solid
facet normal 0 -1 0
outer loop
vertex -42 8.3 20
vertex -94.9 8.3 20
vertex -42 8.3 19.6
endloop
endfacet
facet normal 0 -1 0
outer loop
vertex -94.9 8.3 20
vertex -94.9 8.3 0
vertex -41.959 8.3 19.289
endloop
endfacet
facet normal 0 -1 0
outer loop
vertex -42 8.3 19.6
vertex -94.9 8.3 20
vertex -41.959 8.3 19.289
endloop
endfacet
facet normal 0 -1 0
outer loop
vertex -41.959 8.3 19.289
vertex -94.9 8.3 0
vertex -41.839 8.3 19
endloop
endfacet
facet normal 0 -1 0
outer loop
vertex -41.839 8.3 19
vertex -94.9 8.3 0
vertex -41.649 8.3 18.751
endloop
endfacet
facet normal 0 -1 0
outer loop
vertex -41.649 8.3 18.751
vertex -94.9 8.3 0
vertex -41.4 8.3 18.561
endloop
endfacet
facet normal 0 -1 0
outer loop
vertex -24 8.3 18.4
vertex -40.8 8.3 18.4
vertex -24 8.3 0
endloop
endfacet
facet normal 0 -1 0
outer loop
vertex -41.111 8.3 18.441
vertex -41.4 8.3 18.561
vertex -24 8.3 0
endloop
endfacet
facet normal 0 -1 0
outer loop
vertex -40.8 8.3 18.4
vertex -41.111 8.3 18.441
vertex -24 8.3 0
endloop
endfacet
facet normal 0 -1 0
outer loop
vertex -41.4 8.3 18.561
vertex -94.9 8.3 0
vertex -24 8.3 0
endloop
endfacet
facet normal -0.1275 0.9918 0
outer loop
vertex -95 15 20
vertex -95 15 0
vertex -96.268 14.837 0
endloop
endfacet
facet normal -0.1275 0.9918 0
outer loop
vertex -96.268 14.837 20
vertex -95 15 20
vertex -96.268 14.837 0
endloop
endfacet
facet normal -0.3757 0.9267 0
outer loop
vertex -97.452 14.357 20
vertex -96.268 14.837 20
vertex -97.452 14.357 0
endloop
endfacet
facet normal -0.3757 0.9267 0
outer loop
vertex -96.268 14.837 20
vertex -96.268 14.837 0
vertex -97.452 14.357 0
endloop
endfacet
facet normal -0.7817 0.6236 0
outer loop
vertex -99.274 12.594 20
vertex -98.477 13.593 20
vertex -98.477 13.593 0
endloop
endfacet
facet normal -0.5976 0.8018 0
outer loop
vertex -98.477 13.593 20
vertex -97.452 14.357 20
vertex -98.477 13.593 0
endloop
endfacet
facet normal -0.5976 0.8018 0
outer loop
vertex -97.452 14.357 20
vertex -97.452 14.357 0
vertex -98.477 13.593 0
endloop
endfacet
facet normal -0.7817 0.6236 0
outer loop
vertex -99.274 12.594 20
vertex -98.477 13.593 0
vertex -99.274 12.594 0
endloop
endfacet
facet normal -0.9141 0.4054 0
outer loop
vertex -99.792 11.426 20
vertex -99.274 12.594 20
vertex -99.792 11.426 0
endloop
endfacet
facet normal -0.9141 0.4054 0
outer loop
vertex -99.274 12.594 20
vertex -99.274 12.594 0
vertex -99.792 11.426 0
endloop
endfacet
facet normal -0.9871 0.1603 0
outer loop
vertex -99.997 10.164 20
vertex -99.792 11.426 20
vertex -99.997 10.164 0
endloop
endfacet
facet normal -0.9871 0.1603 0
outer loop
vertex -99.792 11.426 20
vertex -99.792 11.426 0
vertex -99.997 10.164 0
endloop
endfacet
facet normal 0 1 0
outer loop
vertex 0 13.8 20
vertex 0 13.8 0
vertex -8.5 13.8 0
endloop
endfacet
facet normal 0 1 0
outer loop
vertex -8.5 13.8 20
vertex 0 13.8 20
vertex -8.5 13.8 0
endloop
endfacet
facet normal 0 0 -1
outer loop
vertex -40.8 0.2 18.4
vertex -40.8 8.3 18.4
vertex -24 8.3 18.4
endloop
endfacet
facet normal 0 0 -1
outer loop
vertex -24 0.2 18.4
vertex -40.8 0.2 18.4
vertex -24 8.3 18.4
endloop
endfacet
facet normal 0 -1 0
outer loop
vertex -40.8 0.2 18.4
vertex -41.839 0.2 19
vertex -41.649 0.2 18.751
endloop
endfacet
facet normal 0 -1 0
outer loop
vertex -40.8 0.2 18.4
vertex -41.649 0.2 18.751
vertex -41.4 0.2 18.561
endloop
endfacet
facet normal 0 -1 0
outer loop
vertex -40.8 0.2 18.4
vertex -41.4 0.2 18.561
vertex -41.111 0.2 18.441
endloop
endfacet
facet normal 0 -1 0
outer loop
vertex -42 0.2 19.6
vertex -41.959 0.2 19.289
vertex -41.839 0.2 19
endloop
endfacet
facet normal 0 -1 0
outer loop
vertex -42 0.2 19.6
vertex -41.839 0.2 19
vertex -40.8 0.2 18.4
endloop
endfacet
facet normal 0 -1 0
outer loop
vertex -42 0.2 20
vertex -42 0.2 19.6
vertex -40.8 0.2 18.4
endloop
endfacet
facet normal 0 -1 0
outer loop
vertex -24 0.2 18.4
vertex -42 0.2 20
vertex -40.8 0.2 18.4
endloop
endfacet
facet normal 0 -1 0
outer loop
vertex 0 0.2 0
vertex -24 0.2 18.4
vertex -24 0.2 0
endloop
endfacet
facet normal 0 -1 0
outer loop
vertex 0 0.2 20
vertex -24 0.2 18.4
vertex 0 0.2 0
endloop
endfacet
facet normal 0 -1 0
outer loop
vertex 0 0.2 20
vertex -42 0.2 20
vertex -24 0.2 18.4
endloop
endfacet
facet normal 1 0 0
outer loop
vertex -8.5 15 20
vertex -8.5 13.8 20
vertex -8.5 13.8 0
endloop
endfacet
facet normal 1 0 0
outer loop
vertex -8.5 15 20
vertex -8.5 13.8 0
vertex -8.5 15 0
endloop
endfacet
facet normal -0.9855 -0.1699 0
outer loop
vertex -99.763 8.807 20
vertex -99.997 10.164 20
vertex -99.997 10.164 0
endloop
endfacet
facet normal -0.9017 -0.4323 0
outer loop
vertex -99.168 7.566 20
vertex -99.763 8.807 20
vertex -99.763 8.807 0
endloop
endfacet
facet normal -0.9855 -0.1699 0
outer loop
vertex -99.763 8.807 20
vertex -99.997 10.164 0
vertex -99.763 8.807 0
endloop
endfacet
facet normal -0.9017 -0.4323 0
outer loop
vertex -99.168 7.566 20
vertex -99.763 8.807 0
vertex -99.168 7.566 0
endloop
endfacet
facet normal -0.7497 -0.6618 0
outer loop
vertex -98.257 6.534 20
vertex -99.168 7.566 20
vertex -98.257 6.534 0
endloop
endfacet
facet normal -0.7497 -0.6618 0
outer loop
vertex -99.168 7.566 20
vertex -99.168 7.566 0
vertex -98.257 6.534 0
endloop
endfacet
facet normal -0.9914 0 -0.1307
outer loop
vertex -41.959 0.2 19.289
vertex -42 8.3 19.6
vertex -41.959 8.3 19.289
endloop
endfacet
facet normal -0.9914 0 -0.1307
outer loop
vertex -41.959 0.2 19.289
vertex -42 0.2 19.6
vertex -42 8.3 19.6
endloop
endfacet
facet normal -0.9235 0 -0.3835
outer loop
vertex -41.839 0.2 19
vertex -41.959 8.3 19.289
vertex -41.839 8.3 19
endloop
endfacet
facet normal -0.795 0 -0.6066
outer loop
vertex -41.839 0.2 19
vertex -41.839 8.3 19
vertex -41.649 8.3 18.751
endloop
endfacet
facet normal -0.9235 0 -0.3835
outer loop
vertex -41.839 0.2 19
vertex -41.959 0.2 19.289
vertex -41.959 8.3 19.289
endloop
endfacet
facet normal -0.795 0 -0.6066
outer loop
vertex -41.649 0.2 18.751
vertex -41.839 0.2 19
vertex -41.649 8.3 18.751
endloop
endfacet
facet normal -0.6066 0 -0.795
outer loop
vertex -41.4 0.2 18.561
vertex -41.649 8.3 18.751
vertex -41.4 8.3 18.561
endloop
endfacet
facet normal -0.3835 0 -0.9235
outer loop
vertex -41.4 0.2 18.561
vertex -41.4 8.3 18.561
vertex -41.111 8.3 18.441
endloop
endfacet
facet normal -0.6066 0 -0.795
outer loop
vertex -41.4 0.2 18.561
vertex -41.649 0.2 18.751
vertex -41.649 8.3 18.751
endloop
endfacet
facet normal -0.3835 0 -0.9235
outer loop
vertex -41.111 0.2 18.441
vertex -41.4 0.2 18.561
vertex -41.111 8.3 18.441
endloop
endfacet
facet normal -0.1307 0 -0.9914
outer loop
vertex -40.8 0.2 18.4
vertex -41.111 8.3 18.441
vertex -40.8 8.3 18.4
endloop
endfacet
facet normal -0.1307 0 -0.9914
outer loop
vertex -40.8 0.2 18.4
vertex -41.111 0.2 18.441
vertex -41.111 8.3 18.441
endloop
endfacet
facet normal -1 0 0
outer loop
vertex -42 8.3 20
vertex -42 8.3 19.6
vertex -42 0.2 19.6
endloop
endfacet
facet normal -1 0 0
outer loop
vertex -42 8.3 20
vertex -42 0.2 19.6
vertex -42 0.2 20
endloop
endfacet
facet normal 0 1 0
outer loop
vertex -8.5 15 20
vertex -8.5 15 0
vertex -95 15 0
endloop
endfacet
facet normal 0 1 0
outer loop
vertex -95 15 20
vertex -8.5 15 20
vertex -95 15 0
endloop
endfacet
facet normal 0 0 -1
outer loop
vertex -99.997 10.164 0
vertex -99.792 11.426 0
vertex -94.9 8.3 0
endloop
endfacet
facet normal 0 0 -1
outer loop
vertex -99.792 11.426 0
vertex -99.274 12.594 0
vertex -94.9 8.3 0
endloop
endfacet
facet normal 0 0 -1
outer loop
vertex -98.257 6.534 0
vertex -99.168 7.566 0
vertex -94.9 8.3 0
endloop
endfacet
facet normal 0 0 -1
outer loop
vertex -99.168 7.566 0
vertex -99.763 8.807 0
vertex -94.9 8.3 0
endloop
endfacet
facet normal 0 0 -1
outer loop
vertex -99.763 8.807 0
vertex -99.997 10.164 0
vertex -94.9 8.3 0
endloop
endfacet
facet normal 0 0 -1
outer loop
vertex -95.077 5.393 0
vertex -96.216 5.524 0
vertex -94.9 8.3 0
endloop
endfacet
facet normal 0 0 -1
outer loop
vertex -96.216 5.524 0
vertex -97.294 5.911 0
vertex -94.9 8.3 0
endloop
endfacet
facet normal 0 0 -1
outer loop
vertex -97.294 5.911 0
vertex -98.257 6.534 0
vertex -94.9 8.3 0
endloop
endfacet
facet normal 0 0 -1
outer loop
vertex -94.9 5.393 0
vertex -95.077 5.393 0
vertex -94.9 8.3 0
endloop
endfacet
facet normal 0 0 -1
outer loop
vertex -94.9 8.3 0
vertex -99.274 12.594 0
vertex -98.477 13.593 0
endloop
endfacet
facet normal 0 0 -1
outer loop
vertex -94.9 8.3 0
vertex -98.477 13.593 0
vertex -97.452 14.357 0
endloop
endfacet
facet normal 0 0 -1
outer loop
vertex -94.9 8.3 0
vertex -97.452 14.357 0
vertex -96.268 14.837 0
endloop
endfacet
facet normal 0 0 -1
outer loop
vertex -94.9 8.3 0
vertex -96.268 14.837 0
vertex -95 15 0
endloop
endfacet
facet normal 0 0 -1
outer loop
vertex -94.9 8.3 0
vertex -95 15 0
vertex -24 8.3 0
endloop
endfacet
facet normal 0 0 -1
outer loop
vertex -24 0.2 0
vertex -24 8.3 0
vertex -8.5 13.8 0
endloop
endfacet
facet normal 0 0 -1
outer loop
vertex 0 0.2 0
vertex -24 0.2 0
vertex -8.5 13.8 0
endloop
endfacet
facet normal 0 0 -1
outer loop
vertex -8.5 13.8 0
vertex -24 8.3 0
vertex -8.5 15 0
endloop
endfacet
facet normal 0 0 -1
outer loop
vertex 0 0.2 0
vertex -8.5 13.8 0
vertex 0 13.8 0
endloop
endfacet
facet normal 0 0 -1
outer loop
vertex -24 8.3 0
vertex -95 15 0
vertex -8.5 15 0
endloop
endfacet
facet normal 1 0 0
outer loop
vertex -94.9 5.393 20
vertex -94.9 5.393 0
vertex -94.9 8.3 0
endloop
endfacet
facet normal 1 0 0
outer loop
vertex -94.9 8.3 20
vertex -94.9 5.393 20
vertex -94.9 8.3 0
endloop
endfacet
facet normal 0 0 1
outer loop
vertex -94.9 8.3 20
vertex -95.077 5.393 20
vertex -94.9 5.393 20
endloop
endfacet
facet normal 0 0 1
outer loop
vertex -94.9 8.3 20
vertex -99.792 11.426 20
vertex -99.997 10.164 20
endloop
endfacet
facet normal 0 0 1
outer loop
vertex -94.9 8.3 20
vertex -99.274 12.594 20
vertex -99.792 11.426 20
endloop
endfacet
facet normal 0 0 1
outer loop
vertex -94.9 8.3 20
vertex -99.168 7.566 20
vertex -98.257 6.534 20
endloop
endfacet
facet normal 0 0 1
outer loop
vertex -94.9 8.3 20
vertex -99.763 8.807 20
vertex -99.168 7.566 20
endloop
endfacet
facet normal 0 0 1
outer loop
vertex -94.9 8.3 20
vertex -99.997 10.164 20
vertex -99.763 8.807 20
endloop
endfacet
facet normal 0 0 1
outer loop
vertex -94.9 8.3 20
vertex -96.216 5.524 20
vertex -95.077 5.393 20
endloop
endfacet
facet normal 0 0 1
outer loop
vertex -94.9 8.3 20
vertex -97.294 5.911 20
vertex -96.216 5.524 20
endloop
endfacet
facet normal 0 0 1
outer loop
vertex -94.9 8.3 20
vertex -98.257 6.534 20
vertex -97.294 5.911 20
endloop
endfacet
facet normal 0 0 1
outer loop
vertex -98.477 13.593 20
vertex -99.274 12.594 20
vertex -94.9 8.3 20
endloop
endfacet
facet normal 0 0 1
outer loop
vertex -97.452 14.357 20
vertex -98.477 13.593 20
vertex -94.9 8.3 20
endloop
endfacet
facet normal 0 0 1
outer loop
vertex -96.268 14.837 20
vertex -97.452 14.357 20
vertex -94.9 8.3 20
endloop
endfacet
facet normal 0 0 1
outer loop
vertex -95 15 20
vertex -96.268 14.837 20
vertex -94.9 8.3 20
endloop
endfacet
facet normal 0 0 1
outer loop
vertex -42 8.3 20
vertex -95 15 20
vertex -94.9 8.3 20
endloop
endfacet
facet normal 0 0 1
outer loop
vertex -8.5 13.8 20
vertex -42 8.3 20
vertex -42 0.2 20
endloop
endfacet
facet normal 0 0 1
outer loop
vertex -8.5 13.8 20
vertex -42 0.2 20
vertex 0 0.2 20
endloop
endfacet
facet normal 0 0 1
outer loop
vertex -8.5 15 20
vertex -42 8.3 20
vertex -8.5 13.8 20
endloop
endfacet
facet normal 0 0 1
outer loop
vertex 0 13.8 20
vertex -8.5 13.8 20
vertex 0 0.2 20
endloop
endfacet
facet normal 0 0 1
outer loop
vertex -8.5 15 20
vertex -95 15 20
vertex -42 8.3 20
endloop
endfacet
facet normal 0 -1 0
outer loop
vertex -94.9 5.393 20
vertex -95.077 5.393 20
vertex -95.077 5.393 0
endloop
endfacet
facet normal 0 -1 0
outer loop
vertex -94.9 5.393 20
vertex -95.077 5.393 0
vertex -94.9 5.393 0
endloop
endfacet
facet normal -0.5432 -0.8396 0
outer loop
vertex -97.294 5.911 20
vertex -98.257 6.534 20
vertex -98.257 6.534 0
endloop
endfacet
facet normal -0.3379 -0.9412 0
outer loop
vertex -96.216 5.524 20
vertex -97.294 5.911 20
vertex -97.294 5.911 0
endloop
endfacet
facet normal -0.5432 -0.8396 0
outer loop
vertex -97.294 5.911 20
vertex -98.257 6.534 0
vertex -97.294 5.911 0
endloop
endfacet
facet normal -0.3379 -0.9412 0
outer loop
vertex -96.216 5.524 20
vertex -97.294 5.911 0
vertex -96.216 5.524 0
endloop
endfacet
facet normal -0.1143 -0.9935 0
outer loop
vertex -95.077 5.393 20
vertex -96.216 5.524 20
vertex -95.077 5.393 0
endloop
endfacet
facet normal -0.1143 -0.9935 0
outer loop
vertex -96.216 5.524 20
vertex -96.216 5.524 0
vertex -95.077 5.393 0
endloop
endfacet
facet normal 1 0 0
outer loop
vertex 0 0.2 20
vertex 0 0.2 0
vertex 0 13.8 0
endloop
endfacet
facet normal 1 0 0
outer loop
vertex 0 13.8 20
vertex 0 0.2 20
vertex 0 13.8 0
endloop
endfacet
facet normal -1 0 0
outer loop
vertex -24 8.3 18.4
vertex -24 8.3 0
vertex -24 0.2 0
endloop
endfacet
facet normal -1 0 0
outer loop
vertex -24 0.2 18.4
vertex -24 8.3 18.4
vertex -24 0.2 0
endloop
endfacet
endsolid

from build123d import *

# Parameters (mm, degrees)
F1_DEPTH    = 20
F2_W        = 18
F2_H        = 1.6
F3_DEPTH    = 8.1
F4_R        = 1.2
F5_T1_DEPTH = 29.1153030611
F5_T3_DEPTH = 31.6404483572
F5_T5_DEPTH = 45


# Not quite as in the source:
# - a fillet or chamfer that OpenCascade refuses, or shapes differently, is made with other operations: its cross-section is extruded or revolved along the edge and cut away or added


with BuildPart() as f1:
    # F0 (on Top) → F1 (new body)
    with BuildSketch(Plane.XY):
        Polygon((-24, 0.2), (-8.5, 0.2), (0, 0.2), (0, 1.7), (0, 13.8), (-8.5, 13.8), (-8.5, 15), (-100, 15), (-100, 8), (-96.9, 5.3927982226), (-94.9, 5.3927982226), (-94.9, 8.3), (-24, 8.3), align=None)
    extrude(amount=F1_DEPTH)

    # F2 (on face) → F3 (join)
    with BuildSketch(Plane.XZ.offset(-8.3)):
        with Locations((-33, 19.2)):
            Rectangle(F2_W, F2_H)
    extrude(amount=F3_DEPTH)

    # F4
    f4_edges = [f1.edges().sort_by_distance(p)[0] for p in [
        (-42, 4.25, 18.4),
    ]]
    fillet(f4_edges, radius=F4_R)

    # F5: fillet of radius 5 on 3 edges, made by hand

    # F5_s2 → F5_t1 (cut)
    with BuildSketch(Plane.XY.offset(-4.5576515305)):
        with BuildLine():
            ThreePointArc((-98.2952164267, 6.5662210444), (-96.7897023762, 5.6953049607), (-95.0769393878, 5.3927982226))
            Line((-95.0769393878, 5.3927982226), (-96.9, 5.3927982226))
            Line((-96.9, 5.3927982226), (-98.2952164267, 6.5662210444))
        make_face()
    extrude(amount=F5_T1_DEPTH, mode=Mode.SUBTRACT)

    # F5_s4 → F5_t3 (cut)
    with BuildSketch(Plane.XY.offset(-5.8202241786)):
        with BuildLine():
            ThreePointArc((-100, 10.3280896714), (-99.5327356637, 8.217566655), (-98.2182770389, 6.5015124932))
            Line((-98.2182770389, 6.5015124932), (-100, 8))
            Line((-100, 8), (-100, 10.3280896714))
        make_face()
    extrude(amount=F5_T3_DEPTH, mode=Mode.SUBTRACT)

    # F5_s6 → F5_t5 (cut)
    with BuildSketch(Plane.XY.offset(-12.5)):
        with BuildLine():
            ThreePointArc((-95, 15), (-98.5355339059, 13.5355339059), (-100, 10))
            Line((-100, 10), (-100, 15))
            Line((-100, 15), (-95, 15))
        make_face()
    extrude(amount=F5_T5_DEPTH, mode=Mode.SUBTRACT)


solid = f1.part
